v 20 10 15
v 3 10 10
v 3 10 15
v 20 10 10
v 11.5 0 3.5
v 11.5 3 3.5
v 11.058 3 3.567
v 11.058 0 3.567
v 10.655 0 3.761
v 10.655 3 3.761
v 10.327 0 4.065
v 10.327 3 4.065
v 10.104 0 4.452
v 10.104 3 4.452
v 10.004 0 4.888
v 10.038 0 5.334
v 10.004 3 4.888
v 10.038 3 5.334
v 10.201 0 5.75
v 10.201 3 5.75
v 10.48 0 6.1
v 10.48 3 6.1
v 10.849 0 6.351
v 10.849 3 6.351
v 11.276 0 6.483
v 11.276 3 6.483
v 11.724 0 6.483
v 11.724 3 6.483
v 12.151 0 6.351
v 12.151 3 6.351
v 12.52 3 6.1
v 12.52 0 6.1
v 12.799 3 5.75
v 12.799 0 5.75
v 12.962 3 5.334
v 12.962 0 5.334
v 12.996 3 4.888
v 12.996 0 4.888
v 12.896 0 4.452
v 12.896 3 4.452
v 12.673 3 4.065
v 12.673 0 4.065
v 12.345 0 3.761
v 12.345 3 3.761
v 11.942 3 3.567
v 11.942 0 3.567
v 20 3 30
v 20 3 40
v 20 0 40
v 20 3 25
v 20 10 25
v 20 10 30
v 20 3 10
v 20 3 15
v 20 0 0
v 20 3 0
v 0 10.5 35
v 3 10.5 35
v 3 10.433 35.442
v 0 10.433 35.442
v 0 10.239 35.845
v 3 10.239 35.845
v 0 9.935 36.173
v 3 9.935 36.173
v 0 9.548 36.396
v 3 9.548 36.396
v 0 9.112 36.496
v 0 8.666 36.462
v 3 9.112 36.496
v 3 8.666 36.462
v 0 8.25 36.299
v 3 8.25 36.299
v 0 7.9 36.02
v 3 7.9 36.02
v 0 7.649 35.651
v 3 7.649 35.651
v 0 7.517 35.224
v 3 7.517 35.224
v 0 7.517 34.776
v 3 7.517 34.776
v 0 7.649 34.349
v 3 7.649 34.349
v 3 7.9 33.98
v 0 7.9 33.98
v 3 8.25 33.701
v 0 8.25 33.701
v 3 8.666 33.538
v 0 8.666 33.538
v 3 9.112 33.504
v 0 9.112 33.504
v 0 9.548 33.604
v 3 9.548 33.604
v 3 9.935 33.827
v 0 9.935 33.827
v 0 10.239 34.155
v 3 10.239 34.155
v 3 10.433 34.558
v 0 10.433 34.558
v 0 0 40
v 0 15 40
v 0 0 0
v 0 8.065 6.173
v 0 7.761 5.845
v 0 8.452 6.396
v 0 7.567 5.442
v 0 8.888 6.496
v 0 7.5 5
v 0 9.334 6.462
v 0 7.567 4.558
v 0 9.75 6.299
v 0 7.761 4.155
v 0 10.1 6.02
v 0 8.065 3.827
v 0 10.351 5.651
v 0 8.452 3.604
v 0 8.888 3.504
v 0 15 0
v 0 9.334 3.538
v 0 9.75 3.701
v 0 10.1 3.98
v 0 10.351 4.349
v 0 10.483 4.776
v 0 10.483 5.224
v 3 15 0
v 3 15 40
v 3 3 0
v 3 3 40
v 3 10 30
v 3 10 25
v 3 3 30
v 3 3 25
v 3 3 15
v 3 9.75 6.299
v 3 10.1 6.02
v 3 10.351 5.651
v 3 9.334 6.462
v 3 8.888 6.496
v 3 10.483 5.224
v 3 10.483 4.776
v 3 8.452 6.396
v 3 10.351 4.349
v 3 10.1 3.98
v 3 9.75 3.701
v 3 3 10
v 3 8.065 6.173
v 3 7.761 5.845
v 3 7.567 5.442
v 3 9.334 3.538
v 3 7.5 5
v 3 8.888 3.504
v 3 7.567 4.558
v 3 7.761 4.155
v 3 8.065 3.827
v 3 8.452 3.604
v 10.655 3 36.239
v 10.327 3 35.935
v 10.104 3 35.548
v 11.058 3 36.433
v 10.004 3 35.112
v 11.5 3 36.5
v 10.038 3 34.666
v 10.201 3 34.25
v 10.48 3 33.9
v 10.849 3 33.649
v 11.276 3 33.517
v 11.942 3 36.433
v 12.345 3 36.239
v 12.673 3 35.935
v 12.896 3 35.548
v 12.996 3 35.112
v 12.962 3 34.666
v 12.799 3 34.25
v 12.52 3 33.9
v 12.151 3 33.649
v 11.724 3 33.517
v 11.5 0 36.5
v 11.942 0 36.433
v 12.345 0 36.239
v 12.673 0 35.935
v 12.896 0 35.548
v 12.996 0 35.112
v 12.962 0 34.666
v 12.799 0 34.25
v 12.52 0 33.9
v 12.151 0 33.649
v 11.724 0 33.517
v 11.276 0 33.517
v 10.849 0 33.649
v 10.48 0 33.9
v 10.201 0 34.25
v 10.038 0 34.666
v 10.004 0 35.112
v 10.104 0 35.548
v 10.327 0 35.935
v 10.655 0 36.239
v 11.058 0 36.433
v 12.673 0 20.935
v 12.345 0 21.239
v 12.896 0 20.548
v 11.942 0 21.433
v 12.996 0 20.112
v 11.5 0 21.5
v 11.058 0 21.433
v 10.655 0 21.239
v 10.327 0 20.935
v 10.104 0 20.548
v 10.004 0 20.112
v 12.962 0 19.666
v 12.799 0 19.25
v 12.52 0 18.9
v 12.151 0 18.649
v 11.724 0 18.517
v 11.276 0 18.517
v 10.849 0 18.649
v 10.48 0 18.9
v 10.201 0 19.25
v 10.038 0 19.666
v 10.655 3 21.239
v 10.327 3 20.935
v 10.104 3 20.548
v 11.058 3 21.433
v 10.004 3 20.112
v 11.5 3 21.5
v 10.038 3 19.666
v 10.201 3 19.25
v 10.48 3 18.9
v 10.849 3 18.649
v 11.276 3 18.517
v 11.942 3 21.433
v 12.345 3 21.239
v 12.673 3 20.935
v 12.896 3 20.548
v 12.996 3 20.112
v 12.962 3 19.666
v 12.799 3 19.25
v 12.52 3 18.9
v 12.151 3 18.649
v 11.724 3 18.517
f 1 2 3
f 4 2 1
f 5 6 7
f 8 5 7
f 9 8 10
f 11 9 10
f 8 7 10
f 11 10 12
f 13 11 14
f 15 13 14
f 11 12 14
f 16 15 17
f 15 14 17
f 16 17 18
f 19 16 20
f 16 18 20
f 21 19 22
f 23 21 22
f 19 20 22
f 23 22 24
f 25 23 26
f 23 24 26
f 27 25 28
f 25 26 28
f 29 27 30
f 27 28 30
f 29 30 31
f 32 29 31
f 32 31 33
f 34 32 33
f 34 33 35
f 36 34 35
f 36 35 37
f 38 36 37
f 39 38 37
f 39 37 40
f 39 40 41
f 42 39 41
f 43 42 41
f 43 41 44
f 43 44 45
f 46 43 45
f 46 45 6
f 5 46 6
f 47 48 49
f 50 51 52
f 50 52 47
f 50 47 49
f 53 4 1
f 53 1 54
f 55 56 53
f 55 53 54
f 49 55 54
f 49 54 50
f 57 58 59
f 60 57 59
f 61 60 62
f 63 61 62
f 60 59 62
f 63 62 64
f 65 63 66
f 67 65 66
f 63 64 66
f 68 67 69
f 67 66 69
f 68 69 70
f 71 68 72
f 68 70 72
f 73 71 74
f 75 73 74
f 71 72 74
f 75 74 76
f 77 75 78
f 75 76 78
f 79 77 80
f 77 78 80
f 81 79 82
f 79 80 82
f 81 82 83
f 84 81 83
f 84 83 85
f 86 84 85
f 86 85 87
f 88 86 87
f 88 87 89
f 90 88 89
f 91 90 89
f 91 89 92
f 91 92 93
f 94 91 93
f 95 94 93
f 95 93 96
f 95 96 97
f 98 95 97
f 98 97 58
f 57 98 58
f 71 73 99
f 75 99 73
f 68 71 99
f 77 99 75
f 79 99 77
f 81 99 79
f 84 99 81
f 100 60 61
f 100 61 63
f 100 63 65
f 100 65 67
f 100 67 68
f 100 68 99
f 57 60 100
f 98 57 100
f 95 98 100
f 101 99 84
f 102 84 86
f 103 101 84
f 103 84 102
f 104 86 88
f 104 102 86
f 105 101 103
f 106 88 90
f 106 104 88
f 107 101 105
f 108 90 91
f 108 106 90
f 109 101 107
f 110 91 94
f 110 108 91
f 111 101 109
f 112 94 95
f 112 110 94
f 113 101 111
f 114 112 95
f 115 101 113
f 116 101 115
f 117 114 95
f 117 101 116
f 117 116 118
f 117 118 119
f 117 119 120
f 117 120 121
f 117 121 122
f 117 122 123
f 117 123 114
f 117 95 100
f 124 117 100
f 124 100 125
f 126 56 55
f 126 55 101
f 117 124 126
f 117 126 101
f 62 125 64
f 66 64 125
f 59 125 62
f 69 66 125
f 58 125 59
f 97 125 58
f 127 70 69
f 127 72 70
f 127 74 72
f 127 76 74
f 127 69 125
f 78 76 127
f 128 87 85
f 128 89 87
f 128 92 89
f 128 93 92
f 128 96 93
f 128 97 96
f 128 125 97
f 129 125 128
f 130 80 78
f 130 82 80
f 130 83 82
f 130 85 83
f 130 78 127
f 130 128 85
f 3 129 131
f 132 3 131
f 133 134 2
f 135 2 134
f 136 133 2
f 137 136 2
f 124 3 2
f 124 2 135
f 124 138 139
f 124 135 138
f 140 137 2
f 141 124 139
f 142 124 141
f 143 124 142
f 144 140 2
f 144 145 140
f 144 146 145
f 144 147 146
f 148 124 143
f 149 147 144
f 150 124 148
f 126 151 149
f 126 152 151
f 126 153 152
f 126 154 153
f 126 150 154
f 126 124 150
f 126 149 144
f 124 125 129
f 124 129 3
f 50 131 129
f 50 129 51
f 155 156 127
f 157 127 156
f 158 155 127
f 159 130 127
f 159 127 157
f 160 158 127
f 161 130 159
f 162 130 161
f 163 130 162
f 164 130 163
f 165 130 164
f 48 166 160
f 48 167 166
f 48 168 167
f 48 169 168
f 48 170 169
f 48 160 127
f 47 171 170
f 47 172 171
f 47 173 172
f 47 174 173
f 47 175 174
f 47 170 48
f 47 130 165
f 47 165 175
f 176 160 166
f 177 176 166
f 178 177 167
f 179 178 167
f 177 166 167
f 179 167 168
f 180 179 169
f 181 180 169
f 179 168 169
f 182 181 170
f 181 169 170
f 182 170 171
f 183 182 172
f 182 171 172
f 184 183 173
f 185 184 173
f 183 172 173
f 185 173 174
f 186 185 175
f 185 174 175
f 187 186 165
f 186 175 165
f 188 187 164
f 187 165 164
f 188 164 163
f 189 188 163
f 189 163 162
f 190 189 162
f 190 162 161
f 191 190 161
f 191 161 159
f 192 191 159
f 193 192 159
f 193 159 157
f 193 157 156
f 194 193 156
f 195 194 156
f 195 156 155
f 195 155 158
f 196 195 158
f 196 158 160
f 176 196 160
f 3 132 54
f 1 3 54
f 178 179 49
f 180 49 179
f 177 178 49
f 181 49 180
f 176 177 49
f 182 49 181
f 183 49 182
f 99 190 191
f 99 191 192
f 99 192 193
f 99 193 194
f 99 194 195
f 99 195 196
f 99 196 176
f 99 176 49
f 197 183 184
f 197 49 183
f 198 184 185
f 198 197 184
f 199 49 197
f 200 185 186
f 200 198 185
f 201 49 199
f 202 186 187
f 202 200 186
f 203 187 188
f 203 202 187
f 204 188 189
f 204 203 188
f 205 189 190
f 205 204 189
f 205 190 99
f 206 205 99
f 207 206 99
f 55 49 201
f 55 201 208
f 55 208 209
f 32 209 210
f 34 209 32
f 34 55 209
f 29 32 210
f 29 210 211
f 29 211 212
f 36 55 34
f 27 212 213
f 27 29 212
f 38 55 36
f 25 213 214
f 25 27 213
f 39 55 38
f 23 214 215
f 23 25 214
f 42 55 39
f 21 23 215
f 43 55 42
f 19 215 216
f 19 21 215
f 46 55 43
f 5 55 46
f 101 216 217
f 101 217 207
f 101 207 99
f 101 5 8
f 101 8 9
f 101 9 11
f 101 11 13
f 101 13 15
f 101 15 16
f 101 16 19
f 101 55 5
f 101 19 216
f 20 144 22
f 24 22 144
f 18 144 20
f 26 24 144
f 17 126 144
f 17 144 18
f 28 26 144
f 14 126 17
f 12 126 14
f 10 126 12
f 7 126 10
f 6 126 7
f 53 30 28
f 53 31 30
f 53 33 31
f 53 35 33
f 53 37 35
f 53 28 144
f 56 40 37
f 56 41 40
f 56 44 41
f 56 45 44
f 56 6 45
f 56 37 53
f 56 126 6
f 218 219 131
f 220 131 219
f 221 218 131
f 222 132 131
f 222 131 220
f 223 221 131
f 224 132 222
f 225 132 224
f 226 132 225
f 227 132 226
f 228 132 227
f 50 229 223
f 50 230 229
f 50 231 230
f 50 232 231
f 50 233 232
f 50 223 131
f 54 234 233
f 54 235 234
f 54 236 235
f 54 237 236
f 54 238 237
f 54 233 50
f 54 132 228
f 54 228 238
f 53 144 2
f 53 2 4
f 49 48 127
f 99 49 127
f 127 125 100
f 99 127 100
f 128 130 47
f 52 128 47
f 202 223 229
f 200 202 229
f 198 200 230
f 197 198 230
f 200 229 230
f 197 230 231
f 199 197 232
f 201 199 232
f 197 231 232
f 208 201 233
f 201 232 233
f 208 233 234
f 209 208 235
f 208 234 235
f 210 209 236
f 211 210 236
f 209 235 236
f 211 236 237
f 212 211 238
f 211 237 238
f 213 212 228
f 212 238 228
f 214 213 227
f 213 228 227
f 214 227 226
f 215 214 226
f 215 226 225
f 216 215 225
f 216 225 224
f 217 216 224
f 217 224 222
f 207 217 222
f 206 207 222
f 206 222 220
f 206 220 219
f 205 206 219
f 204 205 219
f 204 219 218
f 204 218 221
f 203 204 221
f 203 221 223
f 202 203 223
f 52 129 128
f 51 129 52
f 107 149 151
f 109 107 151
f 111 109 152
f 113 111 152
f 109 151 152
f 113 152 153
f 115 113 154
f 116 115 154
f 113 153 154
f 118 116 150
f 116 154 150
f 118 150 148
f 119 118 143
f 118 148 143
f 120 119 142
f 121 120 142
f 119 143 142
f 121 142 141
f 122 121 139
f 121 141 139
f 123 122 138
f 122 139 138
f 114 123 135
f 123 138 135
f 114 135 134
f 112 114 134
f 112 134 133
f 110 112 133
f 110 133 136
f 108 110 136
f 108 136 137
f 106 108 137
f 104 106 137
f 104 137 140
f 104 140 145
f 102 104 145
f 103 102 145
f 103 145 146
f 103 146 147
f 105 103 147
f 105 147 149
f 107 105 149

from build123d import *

# Parameters (mm, degrees)
EXTRUDE_1_DEPTH     = 40
SKETCH_3_R          = 1.5
CUT_EXTRUDE_1_DEPTH = 46.97825573
SKETCH_4_R          = 1.5
CUT_EXTRUDE_2_DEPTH = 47.303347611
SKETCH_5_W          = 17
SKETCH_5_H          = 5
EXTRUDE_2_DEPTH     = 7


with BuildPart() as part:
    # 草图1 → 凸台-拉伸1 (new body)
    with BuildSketch(Plane.XY):
        Polygon((0, 0), (0, 15), (3, 15), (3, 3), (20, 3), (20, 0), align=None)
    extrude(amount=EXTRUDE_1_DEPTH)

    # 草图3 → 切除-拉伸1 (cut, through all)
    with BuildSketch(Plane(origin=(3, 0, 0), x_dir=(0, 0, -1), z_dir=(1, 0, 0))):
        with Locations(Location((-35, 9, 0), (0, 0, 90))):
            Circle(SKETCH_3_R)
        with Locations(Location((-5, 9, 0), (0, 0, 270))):
            Circle(SKETCH_3_R)
    extrude(amount=-CUT_EXTRUDE_1_DEPTH, mode=Mode.SUBTRACT)

    # 草图4 → 切除-拉伸2 (cut, through all)
    with BuildSketch(Plane(origin=(0, 3, 0), x_dir=(1, 0, 0), z_dir=(0, 1, 0))):
        with Locations(Location((11.5, -20, 0), (0, 0, 270))):
            Circle(SKETCH_4_R)
        with Locations(Location((11.5, -35, 0), (0, 0, 270))):
            Circle(SKETCH_4_R)
        with Locations(Location((11.5, -5, 0), (0, 0, 90))):
            Circle(SKETCH_4_R)
    extrude(amount=-CUT_EXTRUDE_2_DEPTH, mode=Mode.SUBTRACT)

    # 草图5 → 凸台-拉伸2 (add)
    with BuildSketch(Plane(origin=(0, 3, 0), x_dir=(1, 0, 0), z_dir=(0, 1, 0))):
        with Locations((11.5, -27.5)):
            Rectangle(SKETCH_5_W, SKETCH_5_H)
        with Locations((11.5, -12.5)):
            Rectangle(SKETCH_5_W, SKETCH_5_H)
    extrude(amount=EXTRUDE_2_DEPTH)


solid = part.part
